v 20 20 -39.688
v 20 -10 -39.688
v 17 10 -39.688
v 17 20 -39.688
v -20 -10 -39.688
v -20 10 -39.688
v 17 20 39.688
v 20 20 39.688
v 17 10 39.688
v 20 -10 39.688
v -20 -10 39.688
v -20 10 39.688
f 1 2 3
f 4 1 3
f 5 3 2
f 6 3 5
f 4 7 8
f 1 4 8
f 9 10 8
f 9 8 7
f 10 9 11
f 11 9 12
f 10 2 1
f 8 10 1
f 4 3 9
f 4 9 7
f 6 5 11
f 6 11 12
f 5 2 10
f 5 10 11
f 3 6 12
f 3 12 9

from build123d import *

# Parameters (mm, degrees)
BOSS_EXTRUDE1_DEPTH      = 39.6875
BOSS_EXTRUDE1_DEPTH_BACK = 39.6875


with BuildPart() as part:
    # Sketch1 → Boss-Extrude1 (new, two sides: drawn at the far end of the back side and taken through both)
    with BuildSketch(Plane.XY.offset(-BOSS_EXTRUDE1_DEPTH_BACK)):
        Polygon((-20, 10), (17, 10), (17, 20), (20, 20), (20, 10), (20, -10), (-20, -10), align=None)
    extrude(amount=BOSS_EXTRUDE1_DEPTH + BOSS_EXTRUDE1_DEPTH_BACK)


solid = part.part
